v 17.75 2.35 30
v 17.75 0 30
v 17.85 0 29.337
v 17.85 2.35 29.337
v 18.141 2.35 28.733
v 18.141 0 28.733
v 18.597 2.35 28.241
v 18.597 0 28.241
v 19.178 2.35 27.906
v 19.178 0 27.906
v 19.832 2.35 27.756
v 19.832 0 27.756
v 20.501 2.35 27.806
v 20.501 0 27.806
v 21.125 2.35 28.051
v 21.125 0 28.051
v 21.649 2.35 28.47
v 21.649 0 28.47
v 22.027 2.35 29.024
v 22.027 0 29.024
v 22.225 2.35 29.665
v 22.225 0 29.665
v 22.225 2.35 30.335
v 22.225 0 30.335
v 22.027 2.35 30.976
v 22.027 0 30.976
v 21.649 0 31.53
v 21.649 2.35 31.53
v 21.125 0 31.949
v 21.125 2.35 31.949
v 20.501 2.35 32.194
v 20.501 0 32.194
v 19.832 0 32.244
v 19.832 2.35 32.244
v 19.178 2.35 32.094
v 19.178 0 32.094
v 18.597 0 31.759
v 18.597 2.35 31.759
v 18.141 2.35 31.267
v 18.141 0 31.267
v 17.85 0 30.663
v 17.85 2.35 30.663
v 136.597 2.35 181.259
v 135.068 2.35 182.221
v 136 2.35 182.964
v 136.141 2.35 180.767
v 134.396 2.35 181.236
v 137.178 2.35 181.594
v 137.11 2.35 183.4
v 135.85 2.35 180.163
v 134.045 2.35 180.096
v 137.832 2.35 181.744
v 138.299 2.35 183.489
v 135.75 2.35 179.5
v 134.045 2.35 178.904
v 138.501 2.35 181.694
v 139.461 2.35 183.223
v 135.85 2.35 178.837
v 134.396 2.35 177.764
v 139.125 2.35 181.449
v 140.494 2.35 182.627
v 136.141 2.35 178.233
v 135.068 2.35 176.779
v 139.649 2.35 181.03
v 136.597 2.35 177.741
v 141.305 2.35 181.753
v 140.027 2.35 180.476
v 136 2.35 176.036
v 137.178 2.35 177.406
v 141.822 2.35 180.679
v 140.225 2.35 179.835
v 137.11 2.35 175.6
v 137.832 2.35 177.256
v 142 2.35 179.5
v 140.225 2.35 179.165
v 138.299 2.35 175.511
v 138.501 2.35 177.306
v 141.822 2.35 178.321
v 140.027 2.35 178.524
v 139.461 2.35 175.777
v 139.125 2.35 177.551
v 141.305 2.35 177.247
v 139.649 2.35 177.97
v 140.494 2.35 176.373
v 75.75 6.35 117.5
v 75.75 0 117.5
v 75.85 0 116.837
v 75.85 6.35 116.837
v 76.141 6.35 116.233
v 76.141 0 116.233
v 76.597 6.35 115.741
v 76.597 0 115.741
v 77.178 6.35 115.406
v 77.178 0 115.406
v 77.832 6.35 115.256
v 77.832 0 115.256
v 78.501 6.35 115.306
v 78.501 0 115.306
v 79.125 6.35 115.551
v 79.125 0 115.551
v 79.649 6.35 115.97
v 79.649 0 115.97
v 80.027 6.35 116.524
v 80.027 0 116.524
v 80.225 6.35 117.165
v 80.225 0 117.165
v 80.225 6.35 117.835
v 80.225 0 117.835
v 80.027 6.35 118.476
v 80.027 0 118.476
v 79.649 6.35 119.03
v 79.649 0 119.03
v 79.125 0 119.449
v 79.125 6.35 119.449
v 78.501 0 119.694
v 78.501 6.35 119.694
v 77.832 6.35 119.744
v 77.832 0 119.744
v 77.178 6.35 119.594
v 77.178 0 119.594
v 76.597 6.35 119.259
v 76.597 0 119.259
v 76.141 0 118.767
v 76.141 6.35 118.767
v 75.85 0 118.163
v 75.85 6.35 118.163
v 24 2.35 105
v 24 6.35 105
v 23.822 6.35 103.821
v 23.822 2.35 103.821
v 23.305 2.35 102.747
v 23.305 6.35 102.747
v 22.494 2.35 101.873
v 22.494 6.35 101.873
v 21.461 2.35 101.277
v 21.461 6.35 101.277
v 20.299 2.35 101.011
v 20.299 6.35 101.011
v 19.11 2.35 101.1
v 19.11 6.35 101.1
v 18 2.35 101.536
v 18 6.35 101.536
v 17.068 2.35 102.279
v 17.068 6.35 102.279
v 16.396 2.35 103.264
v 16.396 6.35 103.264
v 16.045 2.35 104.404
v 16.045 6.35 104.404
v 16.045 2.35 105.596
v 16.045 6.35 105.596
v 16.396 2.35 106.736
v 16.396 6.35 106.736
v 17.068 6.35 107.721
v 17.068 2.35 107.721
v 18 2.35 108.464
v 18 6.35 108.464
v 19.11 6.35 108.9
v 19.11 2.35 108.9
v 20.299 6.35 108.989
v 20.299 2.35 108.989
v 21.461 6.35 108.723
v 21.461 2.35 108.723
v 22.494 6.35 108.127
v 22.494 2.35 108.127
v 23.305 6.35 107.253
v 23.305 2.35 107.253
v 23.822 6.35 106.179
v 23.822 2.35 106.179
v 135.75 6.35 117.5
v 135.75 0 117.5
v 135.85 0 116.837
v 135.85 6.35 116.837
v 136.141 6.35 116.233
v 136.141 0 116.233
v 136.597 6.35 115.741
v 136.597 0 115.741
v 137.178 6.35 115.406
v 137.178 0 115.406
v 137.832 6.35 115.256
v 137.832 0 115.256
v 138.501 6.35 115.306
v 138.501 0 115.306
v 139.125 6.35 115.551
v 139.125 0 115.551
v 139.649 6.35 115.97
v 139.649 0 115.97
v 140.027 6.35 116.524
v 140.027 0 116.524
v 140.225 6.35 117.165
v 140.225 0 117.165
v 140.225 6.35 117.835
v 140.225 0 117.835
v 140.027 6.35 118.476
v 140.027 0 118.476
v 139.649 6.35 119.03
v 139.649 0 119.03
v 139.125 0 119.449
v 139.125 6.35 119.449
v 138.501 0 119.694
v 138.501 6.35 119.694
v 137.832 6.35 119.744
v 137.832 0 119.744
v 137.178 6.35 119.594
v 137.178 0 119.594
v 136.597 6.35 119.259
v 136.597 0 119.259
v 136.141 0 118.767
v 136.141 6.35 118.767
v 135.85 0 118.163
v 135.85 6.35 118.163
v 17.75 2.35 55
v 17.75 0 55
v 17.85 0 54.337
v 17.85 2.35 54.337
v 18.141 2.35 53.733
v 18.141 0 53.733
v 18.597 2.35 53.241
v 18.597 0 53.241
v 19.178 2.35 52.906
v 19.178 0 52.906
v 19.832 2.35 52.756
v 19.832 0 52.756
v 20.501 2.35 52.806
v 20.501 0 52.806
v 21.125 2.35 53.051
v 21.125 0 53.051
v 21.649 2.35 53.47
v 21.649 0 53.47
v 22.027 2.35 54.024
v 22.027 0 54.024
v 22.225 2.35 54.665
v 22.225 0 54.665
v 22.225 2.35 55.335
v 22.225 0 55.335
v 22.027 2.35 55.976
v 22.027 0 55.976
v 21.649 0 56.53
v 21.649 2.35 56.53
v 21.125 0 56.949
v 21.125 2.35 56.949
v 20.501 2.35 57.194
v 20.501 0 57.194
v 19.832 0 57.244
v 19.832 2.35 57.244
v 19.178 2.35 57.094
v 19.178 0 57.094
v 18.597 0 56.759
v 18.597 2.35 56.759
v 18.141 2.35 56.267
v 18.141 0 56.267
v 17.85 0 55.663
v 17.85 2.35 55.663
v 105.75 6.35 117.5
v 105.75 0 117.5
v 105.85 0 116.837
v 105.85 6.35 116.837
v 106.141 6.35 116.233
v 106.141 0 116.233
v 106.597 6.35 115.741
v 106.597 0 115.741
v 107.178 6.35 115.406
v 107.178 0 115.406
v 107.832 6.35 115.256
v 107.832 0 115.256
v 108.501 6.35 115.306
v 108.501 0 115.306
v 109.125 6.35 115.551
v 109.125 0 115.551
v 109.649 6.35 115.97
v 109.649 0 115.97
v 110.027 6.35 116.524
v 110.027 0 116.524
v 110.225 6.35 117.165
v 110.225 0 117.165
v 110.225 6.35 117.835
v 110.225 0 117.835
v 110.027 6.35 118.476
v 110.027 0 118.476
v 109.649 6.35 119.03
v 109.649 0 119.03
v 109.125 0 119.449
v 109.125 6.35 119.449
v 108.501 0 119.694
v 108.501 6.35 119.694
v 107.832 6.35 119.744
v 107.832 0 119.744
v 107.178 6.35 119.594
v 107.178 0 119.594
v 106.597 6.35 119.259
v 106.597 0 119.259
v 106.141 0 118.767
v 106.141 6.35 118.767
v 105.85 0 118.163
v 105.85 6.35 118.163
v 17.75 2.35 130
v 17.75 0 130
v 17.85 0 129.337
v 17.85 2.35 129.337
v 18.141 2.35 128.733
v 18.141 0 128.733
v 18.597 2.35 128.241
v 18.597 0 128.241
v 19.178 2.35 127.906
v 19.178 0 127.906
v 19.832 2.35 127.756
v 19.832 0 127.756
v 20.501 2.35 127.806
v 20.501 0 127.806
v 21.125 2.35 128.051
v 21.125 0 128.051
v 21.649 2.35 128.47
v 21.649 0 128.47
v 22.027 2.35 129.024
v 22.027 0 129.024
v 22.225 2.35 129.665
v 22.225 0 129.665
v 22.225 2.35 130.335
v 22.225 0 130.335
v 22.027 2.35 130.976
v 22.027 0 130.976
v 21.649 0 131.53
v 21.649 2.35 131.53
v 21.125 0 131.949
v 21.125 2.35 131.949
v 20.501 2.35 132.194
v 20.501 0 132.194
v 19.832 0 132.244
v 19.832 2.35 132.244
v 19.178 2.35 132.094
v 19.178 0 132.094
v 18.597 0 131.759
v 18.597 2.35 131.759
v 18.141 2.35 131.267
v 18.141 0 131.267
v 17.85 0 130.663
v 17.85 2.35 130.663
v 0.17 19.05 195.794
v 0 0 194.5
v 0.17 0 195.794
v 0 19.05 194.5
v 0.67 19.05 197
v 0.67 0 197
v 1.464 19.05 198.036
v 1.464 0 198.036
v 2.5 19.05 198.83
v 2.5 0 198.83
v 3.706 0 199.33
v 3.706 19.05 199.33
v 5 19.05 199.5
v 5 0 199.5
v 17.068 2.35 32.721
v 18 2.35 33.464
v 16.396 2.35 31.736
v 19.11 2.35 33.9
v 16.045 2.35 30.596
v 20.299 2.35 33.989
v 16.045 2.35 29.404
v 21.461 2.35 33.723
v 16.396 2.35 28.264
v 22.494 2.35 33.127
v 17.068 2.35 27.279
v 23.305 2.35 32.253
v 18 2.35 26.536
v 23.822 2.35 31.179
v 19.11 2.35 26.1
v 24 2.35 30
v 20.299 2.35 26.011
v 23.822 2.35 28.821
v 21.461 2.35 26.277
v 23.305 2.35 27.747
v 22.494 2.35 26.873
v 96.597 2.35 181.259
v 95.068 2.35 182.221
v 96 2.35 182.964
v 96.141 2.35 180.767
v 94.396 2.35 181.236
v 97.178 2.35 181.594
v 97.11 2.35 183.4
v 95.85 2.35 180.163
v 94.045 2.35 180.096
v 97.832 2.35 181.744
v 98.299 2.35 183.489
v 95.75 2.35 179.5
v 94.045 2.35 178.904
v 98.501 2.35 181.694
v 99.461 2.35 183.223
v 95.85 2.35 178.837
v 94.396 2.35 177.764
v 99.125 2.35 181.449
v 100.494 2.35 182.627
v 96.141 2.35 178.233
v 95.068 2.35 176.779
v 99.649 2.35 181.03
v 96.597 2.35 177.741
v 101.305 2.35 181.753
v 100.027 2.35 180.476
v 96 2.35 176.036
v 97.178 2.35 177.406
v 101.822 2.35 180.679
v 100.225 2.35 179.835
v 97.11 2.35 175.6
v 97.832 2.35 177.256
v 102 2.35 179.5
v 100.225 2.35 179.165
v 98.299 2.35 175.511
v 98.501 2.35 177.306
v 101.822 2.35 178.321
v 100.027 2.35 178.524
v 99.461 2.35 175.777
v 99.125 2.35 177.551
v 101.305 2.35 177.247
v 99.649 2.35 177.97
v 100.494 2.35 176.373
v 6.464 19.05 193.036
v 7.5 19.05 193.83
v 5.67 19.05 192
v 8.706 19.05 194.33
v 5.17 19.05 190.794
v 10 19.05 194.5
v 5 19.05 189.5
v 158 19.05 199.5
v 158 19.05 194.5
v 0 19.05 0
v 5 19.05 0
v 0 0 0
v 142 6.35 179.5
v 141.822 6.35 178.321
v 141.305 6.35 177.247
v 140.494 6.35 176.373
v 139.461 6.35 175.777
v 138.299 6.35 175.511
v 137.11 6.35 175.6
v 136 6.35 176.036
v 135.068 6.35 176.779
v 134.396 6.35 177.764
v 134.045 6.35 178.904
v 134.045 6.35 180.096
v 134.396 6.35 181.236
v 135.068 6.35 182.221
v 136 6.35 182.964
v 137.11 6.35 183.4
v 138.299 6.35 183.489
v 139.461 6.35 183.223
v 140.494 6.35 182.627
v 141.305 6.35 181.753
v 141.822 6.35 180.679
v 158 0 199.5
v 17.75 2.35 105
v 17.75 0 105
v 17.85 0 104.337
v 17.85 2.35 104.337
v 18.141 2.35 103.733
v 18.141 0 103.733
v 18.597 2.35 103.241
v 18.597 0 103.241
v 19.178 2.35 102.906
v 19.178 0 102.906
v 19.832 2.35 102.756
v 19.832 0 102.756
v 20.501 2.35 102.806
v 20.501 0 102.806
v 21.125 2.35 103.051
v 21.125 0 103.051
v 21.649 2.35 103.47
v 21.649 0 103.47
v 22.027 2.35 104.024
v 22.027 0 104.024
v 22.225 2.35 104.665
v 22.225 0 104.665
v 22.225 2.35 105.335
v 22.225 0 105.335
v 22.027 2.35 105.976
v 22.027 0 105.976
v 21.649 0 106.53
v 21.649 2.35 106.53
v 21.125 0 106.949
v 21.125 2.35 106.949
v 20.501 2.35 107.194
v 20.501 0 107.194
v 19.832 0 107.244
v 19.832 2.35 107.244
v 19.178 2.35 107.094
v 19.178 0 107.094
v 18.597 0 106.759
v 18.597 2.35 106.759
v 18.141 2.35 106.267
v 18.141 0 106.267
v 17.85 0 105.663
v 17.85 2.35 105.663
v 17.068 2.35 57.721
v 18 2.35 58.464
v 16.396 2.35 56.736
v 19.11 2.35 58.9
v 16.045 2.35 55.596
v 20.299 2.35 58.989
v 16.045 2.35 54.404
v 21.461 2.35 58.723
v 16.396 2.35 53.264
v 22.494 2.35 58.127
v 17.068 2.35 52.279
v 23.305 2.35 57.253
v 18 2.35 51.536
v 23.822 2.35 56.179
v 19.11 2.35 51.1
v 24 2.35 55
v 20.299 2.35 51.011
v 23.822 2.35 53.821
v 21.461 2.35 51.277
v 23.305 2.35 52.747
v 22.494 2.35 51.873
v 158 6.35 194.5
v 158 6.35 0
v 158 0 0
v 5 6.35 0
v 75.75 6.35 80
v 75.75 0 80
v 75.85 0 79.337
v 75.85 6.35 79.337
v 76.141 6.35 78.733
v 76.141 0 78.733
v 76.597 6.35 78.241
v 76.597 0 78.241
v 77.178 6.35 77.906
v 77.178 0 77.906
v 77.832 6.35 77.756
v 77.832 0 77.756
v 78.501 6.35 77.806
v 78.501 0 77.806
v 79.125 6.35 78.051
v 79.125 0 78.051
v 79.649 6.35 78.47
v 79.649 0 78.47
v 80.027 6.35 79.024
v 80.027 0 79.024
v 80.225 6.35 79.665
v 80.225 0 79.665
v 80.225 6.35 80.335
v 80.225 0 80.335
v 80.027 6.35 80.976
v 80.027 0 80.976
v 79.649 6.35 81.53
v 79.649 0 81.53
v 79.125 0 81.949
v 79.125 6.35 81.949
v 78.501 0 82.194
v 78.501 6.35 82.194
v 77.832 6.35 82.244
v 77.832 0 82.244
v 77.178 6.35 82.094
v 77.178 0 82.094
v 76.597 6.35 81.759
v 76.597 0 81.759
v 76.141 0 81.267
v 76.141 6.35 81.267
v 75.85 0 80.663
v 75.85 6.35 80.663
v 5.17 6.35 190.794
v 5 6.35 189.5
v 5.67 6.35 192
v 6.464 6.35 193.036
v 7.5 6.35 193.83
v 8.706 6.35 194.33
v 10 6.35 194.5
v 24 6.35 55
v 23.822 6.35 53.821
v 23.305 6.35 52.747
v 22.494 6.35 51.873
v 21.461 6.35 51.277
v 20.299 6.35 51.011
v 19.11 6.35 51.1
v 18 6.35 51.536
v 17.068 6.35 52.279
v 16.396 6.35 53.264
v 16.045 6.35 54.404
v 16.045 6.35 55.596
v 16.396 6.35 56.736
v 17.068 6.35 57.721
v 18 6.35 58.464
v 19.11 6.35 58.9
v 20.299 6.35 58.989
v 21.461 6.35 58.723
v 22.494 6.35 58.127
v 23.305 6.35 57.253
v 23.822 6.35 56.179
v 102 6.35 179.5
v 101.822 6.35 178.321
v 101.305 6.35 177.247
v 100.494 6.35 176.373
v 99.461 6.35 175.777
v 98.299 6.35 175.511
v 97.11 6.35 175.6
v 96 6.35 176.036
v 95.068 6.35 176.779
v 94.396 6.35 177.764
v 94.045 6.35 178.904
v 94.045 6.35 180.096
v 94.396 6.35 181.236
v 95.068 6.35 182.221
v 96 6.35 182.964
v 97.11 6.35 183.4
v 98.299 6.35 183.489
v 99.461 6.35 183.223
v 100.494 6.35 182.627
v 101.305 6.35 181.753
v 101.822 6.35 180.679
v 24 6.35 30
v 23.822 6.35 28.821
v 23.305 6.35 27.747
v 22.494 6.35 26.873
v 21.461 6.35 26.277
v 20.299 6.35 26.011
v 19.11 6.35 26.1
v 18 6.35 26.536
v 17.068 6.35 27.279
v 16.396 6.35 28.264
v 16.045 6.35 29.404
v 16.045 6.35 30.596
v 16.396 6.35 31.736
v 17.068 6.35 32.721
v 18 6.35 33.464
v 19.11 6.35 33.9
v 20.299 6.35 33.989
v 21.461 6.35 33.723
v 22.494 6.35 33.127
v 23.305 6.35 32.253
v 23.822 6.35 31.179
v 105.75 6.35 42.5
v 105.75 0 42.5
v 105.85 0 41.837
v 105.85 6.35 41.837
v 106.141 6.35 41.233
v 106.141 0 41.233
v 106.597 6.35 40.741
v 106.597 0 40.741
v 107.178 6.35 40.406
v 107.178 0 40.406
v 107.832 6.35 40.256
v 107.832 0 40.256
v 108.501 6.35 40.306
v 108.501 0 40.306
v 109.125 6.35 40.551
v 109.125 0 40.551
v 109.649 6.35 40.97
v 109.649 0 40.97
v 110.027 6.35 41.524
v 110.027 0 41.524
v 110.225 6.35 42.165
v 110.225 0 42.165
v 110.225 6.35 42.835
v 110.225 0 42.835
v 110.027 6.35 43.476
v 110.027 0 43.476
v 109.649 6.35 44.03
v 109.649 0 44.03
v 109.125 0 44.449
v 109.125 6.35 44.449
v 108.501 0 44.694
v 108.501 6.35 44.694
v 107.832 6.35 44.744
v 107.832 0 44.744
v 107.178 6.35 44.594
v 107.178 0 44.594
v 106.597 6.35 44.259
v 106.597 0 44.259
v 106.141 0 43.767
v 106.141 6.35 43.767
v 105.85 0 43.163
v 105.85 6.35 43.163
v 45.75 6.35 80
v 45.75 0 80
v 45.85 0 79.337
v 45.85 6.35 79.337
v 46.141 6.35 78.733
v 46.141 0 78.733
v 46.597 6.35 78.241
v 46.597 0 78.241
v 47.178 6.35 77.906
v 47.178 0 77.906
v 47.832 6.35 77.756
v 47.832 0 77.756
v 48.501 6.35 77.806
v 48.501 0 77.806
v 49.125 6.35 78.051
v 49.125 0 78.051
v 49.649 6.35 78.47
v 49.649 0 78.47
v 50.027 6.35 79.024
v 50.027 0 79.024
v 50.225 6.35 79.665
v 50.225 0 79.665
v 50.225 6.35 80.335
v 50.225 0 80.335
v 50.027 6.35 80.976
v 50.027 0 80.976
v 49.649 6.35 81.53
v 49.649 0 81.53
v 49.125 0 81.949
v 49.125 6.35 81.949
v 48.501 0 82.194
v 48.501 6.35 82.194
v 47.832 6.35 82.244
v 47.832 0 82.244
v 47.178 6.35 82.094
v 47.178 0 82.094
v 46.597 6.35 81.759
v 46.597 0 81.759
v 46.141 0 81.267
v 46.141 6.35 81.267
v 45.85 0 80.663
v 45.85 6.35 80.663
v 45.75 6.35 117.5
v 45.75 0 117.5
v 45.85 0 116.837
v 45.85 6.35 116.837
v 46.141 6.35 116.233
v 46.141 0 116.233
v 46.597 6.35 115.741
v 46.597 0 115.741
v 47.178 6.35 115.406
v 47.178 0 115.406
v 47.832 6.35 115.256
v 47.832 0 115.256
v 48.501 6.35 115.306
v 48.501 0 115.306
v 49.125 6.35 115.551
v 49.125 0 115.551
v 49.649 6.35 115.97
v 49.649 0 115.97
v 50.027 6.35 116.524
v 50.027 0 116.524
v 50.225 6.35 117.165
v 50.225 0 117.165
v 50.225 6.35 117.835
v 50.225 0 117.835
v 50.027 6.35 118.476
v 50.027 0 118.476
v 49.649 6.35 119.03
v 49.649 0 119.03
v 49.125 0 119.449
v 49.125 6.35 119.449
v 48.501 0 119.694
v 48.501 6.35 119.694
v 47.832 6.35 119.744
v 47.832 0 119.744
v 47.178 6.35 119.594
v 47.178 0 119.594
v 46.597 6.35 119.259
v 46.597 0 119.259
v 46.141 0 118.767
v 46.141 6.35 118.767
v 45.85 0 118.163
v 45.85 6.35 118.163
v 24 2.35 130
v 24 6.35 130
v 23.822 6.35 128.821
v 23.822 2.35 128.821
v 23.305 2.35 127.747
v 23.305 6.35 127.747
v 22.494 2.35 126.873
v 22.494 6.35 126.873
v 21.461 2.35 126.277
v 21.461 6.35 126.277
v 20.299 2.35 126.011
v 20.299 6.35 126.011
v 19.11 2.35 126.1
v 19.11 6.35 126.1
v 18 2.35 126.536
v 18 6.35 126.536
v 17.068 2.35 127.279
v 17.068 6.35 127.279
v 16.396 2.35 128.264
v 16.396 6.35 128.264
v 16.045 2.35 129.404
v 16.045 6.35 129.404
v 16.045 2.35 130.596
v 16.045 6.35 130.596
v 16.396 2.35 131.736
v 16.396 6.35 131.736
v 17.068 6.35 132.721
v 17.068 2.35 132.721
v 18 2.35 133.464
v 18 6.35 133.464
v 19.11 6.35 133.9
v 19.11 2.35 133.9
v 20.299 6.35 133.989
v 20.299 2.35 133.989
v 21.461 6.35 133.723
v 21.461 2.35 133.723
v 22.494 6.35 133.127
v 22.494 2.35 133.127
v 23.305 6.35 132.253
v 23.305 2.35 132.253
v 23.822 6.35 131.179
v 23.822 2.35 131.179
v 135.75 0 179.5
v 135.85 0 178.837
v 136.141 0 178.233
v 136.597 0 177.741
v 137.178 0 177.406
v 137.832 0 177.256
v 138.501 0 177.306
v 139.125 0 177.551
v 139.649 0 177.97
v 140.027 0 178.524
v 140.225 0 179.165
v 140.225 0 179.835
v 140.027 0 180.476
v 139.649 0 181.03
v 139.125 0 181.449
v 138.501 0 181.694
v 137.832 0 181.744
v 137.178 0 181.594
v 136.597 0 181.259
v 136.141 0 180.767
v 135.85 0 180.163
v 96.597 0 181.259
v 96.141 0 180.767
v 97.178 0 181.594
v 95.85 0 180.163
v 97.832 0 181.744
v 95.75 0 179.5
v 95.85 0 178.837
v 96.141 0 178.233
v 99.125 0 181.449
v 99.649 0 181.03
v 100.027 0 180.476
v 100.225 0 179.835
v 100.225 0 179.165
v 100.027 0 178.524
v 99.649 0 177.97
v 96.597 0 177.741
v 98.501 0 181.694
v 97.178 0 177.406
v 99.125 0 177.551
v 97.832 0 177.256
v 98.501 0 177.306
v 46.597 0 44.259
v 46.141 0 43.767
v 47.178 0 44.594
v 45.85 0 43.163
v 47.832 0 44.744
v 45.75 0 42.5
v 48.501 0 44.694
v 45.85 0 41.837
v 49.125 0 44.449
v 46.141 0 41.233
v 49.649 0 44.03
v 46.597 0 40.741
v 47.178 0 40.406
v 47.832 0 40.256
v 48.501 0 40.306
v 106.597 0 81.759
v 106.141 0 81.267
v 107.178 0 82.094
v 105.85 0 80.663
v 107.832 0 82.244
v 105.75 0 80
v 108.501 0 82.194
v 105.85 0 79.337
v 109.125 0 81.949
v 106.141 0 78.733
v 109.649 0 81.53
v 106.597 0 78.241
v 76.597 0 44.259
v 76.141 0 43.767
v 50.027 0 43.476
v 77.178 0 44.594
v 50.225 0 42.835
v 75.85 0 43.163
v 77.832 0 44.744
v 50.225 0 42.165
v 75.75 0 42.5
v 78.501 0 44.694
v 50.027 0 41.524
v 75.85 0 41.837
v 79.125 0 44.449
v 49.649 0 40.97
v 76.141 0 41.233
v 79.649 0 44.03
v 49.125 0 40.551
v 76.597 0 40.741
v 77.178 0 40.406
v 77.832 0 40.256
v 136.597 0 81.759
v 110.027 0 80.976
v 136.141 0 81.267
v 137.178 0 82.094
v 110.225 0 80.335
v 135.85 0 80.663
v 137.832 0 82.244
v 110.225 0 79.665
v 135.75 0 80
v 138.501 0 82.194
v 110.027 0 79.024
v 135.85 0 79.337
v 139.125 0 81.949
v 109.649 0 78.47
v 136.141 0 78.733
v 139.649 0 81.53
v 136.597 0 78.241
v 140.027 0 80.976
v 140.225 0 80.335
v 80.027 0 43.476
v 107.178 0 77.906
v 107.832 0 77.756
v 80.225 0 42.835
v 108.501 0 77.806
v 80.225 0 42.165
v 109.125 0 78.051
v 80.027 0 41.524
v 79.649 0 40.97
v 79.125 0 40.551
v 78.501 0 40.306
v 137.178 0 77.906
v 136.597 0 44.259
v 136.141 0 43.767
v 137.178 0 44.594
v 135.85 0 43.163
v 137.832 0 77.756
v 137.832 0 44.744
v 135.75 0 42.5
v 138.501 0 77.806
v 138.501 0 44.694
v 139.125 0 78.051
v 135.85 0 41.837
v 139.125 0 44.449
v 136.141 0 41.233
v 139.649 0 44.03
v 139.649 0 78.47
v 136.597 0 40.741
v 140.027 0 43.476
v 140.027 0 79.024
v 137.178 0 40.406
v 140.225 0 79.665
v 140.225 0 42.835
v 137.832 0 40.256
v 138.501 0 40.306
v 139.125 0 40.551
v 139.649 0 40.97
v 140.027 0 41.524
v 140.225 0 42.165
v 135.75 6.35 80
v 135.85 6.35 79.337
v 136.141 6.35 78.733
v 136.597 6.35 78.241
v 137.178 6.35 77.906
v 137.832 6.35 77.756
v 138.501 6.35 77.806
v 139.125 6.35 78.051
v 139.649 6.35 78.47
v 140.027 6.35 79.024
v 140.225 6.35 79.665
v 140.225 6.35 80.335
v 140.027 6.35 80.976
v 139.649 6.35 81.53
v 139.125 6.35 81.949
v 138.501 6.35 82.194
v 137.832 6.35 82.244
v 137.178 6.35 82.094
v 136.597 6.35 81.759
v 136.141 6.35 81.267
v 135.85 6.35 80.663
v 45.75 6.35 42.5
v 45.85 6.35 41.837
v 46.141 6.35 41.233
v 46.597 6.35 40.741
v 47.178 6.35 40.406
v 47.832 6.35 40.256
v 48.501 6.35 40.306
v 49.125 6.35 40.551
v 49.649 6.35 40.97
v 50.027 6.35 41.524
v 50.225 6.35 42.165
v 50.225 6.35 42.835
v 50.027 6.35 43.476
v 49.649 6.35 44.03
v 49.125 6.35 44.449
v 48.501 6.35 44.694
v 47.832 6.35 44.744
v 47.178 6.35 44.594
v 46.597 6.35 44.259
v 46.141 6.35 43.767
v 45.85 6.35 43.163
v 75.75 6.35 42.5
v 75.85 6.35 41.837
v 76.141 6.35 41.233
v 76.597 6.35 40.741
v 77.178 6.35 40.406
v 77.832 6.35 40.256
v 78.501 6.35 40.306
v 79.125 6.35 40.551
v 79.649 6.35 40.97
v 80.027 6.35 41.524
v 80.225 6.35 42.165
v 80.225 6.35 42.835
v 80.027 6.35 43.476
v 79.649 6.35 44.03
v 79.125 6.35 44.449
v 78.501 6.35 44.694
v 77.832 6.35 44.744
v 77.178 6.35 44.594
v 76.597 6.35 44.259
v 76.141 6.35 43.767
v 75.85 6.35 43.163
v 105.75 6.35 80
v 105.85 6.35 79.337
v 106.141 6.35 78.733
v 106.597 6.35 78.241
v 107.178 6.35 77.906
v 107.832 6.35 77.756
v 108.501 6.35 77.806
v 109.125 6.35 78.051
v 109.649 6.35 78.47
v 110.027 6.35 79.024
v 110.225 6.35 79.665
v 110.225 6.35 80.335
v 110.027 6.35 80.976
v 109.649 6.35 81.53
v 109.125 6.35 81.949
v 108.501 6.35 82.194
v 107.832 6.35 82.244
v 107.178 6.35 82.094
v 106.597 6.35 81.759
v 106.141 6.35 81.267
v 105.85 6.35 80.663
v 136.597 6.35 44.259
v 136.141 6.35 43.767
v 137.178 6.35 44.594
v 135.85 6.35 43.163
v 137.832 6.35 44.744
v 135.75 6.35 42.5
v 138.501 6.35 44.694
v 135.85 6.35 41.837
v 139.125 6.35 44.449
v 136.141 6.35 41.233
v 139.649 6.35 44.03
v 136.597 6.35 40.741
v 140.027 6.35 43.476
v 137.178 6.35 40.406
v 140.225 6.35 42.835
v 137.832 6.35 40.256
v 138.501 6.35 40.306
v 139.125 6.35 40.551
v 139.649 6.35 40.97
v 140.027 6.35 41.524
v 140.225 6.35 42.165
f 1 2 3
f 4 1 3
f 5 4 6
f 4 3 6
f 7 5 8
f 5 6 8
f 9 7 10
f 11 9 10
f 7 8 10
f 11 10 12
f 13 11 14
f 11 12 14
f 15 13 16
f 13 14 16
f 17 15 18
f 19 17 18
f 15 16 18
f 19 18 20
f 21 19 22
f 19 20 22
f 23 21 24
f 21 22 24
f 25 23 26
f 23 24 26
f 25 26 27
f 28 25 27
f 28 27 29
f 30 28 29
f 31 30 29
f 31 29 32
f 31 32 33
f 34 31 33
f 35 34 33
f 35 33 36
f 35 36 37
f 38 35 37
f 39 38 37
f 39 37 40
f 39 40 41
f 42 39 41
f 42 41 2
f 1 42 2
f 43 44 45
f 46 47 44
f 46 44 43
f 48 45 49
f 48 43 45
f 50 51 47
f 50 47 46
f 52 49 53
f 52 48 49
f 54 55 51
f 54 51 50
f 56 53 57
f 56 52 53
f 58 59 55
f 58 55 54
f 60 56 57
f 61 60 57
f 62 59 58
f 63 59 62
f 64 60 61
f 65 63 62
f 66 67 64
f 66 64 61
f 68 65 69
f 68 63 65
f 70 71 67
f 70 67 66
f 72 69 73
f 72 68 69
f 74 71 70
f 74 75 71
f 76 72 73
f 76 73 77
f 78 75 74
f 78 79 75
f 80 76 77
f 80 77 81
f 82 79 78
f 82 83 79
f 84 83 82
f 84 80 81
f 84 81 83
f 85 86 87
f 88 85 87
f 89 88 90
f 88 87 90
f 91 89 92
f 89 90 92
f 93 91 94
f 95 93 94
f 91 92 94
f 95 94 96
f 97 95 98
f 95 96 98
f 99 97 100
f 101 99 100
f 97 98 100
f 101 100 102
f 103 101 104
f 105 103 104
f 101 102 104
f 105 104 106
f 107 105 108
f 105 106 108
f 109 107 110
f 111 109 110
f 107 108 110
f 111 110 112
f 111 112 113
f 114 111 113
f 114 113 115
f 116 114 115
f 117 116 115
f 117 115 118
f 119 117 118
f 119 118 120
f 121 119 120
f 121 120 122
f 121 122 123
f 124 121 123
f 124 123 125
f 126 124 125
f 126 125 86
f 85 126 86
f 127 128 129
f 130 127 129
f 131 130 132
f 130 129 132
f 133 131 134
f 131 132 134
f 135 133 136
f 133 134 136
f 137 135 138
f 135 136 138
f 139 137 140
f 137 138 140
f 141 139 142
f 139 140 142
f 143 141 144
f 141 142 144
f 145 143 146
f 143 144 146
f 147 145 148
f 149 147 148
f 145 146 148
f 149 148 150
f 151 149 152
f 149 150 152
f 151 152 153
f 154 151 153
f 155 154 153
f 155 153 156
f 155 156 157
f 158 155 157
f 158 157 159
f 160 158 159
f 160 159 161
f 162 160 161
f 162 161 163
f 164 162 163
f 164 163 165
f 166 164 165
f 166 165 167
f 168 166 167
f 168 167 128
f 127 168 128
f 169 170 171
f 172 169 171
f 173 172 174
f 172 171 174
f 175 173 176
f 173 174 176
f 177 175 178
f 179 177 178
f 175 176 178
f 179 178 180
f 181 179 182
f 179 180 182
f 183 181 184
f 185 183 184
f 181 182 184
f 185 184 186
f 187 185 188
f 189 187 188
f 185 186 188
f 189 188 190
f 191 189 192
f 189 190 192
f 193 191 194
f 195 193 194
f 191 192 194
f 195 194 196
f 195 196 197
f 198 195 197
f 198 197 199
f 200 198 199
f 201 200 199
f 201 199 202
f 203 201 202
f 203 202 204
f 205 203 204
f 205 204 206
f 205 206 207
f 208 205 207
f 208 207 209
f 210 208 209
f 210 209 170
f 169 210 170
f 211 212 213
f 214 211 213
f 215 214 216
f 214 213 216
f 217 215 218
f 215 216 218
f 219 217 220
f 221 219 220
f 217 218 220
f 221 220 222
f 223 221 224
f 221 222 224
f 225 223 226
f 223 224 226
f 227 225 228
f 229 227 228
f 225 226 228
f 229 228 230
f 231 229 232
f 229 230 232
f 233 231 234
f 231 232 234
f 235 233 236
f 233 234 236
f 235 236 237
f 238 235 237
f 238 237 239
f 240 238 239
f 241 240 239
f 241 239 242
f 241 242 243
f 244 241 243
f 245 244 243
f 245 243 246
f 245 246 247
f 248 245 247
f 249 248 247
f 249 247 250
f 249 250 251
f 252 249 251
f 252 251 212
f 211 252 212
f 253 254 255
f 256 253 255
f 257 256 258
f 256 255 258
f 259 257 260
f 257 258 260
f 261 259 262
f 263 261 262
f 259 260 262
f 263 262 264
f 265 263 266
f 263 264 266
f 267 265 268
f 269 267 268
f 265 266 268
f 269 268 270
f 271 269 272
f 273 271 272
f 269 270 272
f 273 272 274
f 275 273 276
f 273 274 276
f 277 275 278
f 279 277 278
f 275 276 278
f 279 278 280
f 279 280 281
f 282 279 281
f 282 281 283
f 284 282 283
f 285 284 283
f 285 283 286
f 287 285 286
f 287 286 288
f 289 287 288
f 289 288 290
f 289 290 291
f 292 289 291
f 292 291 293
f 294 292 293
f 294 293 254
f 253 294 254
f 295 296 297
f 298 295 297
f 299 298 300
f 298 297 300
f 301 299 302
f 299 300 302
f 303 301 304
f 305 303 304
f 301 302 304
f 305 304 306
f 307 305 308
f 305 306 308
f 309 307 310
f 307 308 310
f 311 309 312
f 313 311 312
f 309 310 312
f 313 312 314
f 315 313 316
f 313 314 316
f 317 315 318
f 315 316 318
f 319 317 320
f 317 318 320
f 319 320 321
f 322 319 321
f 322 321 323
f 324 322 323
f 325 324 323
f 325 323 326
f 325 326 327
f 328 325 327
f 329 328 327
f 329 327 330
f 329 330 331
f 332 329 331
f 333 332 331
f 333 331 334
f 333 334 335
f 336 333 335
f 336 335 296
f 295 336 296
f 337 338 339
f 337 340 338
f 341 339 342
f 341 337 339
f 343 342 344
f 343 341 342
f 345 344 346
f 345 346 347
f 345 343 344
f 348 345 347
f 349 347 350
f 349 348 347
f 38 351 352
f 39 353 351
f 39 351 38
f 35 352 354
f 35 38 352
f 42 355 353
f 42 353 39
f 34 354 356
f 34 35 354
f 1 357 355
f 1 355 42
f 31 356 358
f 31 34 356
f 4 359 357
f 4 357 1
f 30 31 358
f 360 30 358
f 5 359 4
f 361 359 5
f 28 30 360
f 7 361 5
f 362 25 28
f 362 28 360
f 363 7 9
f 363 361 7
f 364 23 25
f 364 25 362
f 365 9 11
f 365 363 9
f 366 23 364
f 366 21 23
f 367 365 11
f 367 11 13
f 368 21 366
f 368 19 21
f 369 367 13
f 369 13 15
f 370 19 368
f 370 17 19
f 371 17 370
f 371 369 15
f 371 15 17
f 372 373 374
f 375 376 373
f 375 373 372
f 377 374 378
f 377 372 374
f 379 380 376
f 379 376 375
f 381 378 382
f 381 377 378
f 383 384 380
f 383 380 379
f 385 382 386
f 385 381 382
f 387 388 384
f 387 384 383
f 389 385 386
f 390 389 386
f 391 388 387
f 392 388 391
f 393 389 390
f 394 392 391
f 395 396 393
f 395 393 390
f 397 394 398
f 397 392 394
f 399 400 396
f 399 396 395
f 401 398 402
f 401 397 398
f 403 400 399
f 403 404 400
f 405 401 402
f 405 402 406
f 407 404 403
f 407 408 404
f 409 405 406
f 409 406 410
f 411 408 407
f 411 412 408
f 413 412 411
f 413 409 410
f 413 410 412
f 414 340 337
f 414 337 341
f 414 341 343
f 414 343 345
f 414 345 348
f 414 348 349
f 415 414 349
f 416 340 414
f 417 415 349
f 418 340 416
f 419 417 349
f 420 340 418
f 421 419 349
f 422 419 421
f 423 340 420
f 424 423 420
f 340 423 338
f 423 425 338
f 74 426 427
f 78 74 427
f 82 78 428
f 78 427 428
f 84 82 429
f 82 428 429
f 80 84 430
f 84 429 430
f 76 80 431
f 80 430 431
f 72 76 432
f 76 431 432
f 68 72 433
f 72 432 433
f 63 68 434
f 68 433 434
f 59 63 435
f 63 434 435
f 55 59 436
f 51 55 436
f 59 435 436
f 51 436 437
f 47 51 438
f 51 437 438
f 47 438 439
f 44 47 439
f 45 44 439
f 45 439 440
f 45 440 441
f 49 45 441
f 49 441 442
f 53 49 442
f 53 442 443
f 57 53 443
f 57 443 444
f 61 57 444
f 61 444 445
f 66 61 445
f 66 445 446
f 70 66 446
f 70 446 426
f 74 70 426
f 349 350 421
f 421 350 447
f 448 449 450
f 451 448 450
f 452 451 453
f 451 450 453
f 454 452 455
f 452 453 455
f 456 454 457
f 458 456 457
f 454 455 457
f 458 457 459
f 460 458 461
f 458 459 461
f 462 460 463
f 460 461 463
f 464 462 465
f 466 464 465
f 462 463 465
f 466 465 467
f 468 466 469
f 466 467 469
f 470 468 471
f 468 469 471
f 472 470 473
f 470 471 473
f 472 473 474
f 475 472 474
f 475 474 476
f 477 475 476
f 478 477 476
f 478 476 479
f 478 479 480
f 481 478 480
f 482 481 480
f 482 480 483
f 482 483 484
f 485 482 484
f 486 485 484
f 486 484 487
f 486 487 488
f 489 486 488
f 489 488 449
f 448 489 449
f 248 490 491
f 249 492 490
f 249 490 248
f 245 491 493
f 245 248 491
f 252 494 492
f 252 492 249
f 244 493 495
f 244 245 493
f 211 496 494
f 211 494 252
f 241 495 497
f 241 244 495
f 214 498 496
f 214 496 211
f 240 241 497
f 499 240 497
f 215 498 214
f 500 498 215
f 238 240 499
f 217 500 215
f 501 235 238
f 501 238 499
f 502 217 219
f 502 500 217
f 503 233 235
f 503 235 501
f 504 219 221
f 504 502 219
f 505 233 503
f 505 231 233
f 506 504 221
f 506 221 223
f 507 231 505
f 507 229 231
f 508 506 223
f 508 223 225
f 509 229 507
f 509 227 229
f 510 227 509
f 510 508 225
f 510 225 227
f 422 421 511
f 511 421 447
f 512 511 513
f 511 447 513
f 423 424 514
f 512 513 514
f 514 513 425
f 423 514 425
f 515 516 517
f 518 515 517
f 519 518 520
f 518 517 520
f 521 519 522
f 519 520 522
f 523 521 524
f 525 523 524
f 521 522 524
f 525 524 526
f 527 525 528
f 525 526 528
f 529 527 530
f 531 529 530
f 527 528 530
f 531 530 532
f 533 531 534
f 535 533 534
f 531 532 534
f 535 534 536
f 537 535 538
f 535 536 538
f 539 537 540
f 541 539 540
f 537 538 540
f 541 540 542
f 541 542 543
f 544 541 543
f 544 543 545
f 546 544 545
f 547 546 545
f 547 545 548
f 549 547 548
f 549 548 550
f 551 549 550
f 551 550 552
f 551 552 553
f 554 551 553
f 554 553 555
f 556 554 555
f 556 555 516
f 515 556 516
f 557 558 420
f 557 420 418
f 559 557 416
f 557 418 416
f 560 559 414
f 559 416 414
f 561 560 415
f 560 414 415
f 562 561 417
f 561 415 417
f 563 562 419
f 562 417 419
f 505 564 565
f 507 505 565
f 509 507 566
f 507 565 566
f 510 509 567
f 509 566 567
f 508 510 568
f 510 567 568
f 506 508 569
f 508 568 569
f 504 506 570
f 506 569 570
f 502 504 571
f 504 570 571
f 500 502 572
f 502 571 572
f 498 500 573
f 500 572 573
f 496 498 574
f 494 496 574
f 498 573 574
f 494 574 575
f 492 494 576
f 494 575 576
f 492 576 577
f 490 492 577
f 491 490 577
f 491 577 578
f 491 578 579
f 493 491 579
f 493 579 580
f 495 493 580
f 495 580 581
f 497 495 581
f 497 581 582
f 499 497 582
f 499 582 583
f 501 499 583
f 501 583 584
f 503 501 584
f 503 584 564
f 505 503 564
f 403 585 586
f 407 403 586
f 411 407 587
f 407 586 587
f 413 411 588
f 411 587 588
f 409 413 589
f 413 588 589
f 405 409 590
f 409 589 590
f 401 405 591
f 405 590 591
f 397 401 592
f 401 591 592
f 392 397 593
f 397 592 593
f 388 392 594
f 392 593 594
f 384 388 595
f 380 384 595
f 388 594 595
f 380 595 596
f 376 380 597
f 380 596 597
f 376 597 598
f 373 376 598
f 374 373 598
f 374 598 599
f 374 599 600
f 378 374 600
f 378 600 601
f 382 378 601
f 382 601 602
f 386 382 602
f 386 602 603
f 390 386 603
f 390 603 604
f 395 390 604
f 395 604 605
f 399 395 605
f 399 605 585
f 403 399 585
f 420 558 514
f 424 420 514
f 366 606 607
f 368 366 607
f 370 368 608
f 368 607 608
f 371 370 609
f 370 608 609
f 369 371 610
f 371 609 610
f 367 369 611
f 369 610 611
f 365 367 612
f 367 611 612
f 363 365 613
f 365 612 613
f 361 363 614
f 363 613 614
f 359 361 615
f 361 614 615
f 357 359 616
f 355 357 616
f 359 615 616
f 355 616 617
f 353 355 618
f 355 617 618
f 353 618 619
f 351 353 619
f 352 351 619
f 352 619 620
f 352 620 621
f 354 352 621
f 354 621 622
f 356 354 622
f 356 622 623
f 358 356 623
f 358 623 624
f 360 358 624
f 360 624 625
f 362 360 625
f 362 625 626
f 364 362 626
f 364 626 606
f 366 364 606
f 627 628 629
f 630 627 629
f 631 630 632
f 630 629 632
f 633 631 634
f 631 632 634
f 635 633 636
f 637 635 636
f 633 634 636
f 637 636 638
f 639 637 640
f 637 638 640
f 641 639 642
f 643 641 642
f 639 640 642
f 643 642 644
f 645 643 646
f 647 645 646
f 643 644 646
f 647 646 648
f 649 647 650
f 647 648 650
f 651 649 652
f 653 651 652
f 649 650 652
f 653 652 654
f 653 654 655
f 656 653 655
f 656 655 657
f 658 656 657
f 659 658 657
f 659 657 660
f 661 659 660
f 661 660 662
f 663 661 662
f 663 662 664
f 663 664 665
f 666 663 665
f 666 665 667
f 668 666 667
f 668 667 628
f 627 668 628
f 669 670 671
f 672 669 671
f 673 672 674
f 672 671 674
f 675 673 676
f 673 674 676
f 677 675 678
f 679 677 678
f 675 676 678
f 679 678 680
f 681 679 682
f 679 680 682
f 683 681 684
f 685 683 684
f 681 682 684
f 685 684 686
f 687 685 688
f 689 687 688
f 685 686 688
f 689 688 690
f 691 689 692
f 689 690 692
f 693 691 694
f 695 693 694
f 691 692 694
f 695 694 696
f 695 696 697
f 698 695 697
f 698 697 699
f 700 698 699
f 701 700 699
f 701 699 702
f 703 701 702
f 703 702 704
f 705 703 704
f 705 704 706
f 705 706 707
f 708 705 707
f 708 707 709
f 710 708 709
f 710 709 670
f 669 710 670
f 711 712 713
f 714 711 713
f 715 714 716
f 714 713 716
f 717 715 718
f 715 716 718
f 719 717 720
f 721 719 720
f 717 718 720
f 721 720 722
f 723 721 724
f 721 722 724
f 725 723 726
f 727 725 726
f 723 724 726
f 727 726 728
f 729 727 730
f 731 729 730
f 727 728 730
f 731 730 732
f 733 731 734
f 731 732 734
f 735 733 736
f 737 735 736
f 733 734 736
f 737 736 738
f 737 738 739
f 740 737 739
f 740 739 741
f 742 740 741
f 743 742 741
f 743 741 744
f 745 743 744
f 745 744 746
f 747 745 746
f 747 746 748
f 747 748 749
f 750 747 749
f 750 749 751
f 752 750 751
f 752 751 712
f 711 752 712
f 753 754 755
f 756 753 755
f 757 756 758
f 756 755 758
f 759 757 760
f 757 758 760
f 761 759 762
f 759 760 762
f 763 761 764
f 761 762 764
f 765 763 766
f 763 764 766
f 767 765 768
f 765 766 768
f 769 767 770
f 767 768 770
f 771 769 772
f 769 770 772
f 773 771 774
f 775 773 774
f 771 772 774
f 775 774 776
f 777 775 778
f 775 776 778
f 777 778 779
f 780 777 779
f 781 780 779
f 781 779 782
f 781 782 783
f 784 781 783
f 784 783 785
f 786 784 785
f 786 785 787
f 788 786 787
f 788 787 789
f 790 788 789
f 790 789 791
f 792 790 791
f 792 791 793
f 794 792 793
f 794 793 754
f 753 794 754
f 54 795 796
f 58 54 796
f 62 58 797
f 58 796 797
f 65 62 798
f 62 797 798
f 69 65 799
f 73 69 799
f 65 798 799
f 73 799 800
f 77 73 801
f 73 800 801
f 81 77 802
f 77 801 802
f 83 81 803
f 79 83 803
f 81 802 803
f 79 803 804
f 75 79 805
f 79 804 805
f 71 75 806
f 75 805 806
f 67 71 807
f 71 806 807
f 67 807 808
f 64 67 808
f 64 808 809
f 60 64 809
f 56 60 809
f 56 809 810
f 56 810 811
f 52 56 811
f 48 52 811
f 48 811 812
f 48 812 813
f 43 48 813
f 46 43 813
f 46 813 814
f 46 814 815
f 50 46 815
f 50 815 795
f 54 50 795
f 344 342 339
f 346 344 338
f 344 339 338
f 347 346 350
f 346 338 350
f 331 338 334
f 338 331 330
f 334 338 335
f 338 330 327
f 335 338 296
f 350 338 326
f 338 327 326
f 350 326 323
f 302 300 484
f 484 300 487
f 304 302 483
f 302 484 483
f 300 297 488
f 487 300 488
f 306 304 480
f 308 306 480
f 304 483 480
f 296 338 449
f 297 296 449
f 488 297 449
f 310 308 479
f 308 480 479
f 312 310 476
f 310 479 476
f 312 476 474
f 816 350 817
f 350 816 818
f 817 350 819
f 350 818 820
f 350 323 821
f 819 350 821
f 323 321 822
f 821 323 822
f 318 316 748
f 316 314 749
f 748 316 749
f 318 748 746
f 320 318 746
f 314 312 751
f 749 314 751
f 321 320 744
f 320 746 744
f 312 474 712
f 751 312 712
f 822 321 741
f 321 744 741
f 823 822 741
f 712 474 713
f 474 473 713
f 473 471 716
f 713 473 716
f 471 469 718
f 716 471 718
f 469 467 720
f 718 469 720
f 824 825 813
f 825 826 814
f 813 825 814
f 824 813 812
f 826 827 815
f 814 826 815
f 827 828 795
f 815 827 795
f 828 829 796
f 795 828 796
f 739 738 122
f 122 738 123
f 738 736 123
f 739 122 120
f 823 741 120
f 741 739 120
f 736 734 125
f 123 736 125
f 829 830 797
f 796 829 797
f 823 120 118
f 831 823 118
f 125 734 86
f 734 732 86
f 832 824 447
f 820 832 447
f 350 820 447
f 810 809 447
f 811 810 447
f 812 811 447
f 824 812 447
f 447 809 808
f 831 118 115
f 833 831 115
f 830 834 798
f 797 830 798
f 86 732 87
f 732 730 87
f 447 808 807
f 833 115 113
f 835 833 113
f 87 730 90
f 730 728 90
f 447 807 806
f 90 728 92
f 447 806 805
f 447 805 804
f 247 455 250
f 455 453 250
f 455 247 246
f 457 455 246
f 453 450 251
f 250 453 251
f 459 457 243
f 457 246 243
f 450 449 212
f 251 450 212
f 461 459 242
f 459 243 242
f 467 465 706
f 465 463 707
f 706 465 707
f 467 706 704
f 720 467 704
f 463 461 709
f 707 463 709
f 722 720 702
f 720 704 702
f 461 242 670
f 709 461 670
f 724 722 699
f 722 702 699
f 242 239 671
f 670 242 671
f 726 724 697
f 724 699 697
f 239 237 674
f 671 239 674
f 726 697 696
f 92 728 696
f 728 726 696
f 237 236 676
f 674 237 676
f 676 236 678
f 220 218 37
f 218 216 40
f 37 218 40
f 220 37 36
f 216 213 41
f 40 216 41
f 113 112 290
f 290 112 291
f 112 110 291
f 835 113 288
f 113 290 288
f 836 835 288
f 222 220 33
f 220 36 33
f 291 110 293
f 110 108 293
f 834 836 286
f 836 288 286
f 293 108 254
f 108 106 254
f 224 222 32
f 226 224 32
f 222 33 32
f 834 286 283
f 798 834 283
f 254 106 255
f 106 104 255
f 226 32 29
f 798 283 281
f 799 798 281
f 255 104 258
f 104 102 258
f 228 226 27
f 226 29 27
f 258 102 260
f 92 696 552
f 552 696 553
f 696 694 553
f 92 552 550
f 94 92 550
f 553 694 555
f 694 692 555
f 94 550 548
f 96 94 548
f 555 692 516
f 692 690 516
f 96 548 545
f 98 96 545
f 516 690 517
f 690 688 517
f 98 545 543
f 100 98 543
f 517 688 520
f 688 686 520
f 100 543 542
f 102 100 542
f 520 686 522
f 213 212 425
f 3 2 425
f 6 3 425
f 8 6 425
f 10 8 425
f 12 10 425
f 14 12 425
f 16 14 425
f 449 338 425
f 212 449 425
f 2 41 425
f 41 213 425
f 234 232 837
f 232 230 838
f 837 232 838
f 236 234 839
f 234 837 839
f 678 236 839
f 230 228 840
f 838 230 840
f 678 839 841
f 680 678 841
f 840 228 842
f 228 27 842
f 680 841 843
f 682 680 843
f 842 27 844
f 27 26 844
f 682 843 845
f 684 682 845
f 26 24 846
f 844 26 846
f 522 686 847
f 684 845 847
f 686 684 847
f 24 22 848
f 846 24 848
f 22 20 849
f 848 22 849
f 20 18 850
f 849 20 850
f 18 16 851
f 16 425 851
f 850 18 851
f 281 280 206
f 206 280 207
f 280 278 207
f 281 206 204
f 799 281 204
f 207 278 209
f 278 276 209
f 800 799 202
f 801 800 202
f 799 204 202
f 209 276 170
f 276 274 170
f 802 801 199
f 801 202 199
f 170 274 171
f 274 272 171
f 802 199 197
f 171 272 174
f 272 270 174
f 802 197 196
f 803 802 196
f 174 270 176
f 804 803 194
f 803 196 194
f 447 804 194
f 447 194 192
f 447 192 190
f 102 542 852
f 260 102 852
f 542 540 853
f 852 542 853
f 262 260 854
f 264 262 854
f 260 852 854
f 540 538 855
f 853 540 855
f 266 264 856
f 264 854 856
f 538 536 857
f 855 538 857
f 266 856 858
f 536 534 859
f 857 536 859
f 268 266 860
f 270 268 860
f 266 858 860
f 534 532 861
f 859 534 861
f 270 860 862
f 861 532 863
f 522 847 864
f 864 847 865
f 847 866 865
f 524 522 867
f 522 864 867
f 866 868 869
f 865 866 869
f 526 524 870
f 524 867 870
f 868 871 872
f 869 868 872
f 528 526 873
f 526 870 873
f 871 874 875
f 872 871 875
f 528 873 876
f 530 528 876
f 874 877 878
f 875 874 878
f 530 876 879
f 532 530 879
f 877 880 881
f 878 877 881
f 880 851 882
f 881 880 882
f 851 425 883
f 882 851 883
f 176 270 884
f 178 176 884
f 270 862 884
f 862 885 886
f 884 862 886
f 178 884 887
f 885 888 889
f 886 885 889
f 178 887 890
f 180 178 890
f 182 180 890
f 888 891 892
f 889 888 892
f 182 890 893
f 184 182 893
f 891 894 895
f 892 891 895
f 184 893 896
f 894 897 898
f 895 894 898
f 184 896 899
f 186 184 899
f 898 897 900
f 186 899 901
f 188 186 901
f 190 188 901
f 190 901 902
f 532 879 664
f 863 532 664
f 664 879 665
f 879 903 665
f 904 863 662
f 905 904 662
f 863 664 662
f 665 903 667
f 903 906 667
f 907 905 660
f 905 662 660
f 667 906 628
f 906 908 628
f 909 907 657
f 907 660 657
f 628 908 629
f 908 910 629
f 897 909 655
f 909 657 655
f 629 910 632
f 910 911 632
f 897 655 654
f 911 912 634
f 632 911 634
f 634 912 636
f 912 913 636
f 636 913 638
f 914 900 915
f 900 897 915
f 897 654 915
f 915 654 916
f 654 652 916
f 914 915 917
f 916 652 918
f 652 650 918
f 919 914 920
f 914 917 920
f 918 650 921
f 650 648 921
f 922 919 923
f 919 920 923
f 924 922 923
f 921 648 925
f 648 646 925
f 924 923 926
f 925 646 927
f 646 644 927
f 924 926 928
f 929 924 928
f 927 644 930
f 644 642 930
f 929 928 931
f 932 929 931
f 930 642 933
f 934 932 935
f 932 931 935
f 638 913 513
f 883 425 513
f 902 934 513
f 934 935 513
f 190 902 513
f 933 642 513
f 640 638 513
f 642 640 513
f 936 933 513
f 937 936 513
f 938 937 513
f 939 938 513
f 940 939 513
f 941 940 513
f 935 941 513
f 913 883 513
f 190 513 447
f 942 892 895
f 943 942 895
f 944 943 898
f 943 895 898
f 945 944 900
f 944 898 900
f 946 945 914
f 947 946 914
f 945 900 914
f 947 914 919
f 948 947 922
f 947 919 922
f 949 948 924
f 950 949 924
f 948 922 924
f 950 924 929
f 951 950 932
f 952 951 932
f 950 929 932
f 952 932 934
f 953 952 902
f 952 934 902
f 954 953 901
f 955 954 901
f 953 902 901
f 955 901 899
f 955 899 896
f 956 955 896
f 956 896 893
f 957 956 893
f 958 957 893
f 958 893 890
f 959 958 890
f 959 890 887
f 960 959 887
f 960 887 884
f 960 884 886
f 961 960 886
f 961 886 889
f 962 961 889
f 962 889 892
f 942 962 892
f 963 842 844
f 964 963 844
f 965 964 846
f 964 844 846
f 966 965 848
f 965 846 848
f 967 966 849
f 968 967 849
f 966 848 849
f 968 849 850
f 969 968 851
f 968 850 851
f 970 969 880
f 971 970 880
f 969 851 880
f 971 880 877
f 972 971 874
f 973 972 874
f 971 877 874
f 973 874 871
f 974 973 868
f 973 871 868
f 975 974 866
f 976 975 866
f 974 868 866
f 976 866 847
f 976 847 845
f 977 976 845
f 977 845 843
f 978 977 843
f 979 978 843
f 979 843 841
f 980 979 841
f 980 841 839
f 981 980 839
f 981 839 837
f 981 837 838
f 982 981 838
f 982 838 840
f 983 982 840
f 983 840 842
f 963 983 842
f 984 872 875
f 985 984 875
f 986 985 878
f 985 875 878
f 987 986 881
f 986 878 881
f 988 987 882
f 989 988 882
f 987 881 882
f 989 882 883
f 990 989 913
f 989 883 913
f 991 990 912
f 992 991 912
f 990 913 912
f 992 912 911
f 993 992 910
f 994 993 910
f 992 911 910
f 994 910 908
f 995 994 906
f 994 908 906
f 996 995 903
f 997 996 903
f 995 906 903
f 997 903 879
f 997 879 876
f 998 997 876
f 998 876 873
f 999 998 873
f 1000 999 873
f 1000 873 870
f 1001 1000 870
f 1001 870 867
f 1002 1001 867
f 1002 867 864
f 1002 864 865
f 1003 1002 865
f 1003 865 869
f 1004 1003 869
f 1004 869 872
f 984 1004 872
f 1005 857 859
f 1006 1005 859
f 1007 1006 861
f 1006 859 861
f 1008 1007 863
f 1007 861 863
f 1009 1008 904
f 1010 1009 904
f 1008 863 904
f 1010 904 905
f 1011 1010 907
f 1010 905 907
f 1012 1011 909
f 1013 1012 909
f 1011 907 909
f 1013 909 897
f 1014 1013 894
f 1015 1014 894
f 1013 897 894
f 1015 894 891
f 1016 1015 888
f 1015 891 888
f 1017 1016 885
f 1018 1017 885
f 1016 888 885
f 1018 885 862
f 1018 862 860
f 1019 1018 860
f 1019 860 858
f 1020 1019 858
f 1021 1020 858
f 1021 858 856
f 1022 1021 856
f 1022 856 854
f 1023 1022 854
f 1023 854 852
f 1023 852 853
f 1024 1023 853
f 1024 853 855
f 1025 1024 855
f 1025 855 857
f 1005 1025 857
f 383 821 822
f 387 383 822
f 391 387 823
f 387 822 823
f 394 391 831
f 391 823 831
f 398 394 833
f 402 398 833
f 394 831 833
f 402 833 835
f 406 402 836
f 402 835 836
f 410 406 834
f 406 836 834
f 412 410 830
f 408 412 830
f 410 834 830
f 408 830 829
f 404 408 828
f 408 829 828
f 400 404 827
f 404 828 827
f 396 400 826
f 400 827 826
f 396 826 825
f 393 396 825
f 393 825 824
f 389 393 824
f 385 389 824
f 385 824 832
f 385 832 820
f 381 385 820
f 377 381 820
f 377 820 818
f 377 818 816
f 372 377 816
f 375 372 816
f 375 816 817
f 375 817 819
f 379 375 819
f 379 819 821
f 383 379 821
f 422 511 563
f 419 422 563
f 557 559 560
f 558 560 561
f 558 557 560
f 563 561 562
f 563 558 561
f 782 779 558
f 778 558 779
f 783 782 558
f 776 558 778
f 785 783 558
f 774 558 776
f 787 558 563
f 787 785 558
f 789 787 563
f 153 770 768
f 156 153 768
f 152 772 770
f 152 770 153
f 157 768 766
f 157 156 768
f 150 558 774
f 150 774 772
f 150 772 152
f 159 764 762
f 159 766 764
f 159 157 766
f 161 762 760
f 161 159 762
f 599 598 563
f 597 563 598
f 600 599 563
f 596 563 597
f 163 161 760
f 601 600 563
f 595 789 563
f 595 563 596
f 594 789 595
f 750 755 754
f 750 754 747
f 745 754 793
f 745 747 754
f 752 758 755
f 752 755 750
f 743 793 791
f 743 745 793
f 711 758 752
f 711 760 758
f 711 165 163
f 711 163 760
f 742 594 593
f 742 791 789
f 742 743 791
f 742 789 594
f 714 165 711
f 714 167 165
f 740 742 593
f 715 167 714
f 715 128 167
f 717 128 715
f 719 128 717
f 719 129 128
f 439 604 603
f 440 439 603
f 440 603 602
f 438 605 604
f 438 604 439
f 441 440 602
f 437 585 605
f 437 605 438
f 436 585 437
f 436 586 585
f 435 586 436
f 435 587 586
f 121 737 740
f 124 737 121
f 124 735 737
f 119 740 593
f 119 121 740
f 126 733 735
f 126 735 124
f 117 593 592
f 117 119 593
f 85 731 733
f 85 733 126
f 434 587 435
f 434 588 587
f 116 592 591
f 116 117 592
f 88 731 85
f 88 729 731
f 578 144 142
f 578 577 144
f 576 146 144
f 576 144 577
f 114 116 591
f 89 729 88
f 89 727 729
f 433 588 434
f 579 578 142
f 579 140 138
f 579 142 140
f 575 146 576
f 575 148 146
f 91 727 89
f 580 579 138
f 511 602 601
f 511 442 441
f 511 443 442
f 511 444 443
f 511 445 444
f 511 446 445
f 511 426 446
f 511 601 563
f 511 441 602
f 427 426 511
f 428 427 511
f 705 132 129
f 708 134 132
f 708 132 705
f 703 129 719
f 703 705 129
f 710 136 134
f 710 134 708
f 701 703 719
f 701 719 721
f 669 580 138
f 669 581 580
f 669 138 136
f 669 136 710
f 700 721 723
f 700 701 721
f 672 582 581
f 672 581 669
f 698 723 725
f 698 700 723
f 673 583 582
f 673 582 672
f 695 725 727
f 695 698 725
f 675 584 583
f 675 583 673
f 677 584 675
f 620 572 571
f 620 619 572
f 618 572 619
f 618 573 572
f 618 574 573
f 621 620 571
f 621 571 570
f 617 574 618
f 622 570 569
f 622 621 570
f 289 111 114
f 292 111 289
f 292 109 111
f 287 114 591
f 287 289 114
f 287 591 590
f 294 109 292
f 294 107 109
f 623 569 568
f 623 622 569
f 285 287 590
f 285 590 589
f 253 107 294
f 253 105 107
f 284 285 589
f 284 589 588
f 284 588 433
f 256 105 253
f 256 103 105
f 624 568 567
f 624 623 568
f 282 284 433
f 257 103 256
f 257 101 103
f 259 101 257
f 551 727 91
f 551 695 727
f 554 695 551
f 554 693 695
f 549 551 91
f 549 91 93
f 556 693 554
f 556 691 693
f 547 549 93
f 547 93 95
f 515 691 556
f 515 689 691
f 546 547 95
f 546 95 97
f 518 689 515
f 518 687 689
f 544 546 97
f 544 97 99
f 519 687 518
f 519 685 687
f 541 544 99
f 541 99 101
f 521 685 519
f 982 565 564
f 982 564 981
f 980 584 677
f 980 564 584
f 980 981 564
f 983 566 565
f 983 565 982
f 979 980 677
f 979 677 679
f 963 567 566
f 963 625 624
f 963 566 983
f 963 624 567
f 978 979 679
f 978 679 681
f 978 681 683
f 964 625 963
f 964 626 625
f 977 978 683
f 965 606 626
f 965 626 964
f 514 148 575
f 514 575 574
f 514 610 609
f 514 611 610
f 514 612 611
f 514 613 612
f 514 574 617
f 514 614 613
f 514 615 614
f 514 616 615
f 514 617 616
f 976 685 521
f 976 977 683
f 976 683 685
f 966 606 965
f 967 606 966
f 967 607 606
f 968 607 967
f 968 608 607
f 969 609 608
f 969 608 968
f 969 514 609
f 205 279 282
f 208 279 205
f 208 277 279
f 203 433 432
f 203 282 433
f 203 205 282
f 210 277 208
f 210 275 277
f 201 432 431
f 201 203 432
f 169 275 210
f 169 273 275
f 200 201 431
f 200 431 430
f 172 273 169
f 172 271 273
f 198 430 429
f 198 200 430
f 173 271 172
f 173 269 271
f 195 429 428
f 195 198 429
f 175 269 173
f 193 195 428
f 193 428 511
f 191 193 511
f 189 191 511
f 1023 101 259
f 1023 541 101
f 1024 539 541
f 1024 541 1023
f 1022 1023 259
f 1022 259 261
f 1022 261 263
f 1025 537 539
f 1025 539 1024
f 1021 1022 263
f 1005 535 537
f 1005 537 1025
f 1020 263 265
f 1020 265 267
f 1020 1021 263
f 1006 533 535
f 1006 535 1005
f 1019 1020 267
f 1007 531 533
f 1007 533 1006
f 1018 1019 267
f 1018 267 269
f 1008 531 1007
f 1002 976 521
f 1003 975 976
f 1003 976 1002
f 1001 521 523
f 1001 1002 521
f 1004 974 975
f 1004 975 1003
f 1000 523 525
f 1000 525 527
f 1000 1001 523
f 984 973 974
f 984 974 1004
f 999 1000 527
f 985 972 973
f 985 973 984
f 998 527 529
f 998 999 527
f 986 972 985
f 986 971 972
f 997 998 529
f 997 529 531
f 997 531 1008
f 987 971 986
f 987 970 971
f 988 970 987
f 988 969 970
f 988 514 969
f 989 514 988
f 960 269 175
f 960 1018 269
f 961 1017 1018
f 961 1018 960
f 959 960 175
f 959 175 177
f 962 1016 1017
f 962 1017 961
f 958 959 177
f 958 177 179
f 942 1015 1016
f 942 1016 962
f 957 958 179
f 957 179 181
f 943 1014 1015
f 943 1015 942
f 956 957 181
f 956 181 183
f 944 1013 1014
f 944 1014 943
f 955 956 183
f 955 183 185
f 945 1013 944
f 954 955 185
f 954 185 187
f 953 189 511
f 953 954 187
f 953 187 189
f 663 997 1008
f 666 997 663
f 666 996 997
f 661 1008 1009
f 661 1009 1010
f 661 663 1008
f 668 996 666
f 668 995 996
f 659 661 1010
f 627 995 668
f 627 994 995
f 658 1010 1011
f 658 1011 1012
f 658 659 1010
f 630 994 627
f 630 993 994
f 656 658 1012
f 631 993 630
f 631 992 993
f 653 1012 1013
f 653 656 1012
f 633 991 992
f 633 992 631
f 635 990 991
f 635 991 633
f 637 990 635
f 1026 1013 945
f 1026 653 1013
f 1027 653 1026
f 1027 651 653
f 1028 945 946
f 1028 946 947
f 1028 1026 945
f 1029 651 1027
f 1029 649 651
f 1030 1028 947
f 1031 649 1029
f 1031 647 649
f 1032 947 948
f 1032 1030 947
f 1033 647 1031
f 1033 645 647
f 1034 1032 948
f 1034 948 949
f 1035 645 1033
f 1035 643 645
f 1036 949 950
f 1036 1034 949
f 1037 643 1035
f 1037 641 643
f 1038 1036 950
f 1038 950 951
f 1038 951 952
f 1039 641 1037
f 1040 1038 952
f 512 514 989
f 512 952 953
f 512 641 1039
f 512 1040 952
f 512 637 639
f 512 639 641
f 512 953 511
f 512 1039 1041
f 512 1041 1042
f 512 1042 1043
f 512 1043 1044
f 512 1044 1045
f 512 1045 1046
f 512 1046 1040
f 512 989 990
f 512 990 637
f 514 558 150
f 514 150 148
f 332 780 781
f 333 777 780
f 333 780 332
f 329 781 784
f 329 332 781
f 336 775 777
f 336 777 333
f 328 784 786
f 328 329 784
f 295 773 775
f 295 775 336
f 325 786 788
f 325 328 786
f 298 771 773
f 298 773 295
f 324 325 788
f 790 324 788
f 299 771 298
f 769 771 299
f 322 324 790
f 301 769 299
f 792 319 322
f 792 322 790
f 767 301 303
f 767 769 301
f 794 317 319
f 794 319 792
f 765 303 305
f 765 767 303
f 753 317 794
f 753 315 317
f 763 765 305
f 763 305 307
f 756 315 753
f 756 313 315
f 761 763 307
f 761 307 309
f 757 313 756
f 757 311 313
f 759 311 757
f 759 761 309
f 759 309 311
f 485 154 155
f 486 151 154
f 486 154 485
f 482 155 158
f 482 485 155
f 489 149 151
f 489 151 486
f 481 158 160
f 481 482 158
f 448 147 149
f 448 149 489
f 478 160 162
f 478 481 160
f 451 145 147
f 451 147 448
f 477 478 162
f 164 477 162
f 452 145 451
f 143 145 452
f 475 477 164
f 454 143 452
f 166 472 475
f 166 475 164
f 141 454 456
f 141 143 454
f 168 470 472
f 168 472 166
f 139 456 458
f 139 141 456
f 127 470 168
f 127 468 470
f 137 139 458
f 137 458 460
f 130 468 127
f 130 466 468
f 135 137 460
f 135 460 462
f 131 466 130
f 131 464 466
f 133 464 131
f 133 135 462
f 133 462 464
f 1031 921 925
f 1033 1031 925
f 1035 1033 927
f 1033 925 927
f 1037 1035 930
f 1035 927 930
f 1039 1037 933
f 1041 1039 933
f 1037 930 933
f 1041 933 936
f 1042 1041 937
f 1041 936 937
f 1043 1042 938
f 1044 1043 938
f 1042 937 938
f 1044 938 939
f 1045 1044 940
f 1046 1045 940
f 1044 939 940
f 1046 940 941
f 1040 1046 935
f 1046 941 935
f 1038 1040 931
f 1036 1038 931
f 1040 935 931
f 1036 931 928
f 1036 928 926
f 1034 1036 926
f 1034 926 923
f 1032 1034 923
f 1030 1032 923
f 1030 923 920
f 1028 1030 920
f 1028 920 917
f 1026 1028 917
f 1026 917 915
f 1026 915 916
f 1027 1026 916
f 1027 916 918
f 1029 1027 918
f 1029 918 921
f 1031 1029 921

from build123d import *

# Parameters (mm, degrees)
SKETCH1_W                      = 158
SKETCH1_H                      = 199.5
BOSS_EXTRUDE1_DEPTH            = 6.35
BOSS_EXTRUDE2_DEPTH            = 12.7
CBORE_FOR_M4_SHCS1_D           = 4.5
CBORE_FOR_M4_SHCS1_DEPTH       = 6.35
CBORE_FOR_M4_SHCS1_CBORE_D     = 8
CBORE_FOR_M4_SHCS1_CBORE_DEPTH = 4
M4_CLEARANCE_HOLE2_D           = 4.5
M4_CLEARANCE_HOLE2_DEPTH       = 6.35
LPATTERN1_COUNT                = 4
LPATTERN1_PITCH                = 30
LPATTERN1_COUNT_DIR2           = 3
LPATTERN1_PITCH_DIR2           = 37.5
FILLET2_R                      = 5


with BuildPart() as part:
    # Sketch1 → Boss-Extrude1 (new body)
    with BuildSketch(Plane(origin=(0, 0, 0), x_dir=(1, 0, 0), z_dir=(0, 1, 0))):
        with Locations((79, -99.75)):
            Rectangle(SKETCH1_W, SKETCH1_H)
    extrude(amount=BOSS_EXTRUDE1_DEPTH)

    # Sketch3 → Boss-Extrude2 (add)
    with BuildSketch(Plane(origin=(0, 6.35, 0), x_dir=(1, 0, 0), z_dir=(0, 1, 0))):
        Polygon((0, 0), (0, -199.5), (158, -199.5), (158, -194.5), (5, -194.5), (5, 0), align=None)
    extrude(amount=BOSS_EXTRUDE2_DEPTH)

    # CBORE for M4 SHCS1
    with Locations(Plane(origin=(0, 6.35, 0), x_dir=(1, 0, 0), z_dir=(0, 1, 0))):
        with Locations((20, -55), (98, -179.5), (138, -179.5), (20, -130), (20, -105), (20, -30)):
            CounterBoreHole(CBORE_FOR_M4_SHCS1_D / 2, CBORE_FOR_M4_SHCS1_CBORE_D / 2, CBORE_FOR_M4_SHCS1_CBORE_DEPTH, depth=CBORE_FOR_M4_SHCS1_DEPTH)

    # M4 Clearance Hole2
    with Locations(Plane(origin=(0, 6.35, 0), x_dir=(1, 0, 0), z_dir=(0, 1, 0))):
        with Locations((138, -117.5)):
            m4_clearance_hole2 = Hole(M4_CLEARANCE_HOLE2_D / 2, depth=M4_CLEARANCE_HOLE2_DEPTH)

    # LPattern1: M4 Clearance Hole2 4 × 3
    with Locations(*[(-i * LPATTERN1_PITCH, 0, -j * LPATTERN1_PITCH_DIR2) for i in range(LPATTERN1_COUNT) for j in range(LPATTERN1_COUNT_DIR2) if (i, j) != (0, 0)]):
        add(m4_clearance_hole2, mode=Mode.SUBTRACT)

    # Fillet2
    fillet2_edges = [part.edges().sort_by_distance(p)[0] for p in [
        (5, 12.7, 194.5),
        (0, 9.525, 199.5),
    ]]
    fillet(fillet2_edges, radius=FILLET2_R)


solid = part.part
